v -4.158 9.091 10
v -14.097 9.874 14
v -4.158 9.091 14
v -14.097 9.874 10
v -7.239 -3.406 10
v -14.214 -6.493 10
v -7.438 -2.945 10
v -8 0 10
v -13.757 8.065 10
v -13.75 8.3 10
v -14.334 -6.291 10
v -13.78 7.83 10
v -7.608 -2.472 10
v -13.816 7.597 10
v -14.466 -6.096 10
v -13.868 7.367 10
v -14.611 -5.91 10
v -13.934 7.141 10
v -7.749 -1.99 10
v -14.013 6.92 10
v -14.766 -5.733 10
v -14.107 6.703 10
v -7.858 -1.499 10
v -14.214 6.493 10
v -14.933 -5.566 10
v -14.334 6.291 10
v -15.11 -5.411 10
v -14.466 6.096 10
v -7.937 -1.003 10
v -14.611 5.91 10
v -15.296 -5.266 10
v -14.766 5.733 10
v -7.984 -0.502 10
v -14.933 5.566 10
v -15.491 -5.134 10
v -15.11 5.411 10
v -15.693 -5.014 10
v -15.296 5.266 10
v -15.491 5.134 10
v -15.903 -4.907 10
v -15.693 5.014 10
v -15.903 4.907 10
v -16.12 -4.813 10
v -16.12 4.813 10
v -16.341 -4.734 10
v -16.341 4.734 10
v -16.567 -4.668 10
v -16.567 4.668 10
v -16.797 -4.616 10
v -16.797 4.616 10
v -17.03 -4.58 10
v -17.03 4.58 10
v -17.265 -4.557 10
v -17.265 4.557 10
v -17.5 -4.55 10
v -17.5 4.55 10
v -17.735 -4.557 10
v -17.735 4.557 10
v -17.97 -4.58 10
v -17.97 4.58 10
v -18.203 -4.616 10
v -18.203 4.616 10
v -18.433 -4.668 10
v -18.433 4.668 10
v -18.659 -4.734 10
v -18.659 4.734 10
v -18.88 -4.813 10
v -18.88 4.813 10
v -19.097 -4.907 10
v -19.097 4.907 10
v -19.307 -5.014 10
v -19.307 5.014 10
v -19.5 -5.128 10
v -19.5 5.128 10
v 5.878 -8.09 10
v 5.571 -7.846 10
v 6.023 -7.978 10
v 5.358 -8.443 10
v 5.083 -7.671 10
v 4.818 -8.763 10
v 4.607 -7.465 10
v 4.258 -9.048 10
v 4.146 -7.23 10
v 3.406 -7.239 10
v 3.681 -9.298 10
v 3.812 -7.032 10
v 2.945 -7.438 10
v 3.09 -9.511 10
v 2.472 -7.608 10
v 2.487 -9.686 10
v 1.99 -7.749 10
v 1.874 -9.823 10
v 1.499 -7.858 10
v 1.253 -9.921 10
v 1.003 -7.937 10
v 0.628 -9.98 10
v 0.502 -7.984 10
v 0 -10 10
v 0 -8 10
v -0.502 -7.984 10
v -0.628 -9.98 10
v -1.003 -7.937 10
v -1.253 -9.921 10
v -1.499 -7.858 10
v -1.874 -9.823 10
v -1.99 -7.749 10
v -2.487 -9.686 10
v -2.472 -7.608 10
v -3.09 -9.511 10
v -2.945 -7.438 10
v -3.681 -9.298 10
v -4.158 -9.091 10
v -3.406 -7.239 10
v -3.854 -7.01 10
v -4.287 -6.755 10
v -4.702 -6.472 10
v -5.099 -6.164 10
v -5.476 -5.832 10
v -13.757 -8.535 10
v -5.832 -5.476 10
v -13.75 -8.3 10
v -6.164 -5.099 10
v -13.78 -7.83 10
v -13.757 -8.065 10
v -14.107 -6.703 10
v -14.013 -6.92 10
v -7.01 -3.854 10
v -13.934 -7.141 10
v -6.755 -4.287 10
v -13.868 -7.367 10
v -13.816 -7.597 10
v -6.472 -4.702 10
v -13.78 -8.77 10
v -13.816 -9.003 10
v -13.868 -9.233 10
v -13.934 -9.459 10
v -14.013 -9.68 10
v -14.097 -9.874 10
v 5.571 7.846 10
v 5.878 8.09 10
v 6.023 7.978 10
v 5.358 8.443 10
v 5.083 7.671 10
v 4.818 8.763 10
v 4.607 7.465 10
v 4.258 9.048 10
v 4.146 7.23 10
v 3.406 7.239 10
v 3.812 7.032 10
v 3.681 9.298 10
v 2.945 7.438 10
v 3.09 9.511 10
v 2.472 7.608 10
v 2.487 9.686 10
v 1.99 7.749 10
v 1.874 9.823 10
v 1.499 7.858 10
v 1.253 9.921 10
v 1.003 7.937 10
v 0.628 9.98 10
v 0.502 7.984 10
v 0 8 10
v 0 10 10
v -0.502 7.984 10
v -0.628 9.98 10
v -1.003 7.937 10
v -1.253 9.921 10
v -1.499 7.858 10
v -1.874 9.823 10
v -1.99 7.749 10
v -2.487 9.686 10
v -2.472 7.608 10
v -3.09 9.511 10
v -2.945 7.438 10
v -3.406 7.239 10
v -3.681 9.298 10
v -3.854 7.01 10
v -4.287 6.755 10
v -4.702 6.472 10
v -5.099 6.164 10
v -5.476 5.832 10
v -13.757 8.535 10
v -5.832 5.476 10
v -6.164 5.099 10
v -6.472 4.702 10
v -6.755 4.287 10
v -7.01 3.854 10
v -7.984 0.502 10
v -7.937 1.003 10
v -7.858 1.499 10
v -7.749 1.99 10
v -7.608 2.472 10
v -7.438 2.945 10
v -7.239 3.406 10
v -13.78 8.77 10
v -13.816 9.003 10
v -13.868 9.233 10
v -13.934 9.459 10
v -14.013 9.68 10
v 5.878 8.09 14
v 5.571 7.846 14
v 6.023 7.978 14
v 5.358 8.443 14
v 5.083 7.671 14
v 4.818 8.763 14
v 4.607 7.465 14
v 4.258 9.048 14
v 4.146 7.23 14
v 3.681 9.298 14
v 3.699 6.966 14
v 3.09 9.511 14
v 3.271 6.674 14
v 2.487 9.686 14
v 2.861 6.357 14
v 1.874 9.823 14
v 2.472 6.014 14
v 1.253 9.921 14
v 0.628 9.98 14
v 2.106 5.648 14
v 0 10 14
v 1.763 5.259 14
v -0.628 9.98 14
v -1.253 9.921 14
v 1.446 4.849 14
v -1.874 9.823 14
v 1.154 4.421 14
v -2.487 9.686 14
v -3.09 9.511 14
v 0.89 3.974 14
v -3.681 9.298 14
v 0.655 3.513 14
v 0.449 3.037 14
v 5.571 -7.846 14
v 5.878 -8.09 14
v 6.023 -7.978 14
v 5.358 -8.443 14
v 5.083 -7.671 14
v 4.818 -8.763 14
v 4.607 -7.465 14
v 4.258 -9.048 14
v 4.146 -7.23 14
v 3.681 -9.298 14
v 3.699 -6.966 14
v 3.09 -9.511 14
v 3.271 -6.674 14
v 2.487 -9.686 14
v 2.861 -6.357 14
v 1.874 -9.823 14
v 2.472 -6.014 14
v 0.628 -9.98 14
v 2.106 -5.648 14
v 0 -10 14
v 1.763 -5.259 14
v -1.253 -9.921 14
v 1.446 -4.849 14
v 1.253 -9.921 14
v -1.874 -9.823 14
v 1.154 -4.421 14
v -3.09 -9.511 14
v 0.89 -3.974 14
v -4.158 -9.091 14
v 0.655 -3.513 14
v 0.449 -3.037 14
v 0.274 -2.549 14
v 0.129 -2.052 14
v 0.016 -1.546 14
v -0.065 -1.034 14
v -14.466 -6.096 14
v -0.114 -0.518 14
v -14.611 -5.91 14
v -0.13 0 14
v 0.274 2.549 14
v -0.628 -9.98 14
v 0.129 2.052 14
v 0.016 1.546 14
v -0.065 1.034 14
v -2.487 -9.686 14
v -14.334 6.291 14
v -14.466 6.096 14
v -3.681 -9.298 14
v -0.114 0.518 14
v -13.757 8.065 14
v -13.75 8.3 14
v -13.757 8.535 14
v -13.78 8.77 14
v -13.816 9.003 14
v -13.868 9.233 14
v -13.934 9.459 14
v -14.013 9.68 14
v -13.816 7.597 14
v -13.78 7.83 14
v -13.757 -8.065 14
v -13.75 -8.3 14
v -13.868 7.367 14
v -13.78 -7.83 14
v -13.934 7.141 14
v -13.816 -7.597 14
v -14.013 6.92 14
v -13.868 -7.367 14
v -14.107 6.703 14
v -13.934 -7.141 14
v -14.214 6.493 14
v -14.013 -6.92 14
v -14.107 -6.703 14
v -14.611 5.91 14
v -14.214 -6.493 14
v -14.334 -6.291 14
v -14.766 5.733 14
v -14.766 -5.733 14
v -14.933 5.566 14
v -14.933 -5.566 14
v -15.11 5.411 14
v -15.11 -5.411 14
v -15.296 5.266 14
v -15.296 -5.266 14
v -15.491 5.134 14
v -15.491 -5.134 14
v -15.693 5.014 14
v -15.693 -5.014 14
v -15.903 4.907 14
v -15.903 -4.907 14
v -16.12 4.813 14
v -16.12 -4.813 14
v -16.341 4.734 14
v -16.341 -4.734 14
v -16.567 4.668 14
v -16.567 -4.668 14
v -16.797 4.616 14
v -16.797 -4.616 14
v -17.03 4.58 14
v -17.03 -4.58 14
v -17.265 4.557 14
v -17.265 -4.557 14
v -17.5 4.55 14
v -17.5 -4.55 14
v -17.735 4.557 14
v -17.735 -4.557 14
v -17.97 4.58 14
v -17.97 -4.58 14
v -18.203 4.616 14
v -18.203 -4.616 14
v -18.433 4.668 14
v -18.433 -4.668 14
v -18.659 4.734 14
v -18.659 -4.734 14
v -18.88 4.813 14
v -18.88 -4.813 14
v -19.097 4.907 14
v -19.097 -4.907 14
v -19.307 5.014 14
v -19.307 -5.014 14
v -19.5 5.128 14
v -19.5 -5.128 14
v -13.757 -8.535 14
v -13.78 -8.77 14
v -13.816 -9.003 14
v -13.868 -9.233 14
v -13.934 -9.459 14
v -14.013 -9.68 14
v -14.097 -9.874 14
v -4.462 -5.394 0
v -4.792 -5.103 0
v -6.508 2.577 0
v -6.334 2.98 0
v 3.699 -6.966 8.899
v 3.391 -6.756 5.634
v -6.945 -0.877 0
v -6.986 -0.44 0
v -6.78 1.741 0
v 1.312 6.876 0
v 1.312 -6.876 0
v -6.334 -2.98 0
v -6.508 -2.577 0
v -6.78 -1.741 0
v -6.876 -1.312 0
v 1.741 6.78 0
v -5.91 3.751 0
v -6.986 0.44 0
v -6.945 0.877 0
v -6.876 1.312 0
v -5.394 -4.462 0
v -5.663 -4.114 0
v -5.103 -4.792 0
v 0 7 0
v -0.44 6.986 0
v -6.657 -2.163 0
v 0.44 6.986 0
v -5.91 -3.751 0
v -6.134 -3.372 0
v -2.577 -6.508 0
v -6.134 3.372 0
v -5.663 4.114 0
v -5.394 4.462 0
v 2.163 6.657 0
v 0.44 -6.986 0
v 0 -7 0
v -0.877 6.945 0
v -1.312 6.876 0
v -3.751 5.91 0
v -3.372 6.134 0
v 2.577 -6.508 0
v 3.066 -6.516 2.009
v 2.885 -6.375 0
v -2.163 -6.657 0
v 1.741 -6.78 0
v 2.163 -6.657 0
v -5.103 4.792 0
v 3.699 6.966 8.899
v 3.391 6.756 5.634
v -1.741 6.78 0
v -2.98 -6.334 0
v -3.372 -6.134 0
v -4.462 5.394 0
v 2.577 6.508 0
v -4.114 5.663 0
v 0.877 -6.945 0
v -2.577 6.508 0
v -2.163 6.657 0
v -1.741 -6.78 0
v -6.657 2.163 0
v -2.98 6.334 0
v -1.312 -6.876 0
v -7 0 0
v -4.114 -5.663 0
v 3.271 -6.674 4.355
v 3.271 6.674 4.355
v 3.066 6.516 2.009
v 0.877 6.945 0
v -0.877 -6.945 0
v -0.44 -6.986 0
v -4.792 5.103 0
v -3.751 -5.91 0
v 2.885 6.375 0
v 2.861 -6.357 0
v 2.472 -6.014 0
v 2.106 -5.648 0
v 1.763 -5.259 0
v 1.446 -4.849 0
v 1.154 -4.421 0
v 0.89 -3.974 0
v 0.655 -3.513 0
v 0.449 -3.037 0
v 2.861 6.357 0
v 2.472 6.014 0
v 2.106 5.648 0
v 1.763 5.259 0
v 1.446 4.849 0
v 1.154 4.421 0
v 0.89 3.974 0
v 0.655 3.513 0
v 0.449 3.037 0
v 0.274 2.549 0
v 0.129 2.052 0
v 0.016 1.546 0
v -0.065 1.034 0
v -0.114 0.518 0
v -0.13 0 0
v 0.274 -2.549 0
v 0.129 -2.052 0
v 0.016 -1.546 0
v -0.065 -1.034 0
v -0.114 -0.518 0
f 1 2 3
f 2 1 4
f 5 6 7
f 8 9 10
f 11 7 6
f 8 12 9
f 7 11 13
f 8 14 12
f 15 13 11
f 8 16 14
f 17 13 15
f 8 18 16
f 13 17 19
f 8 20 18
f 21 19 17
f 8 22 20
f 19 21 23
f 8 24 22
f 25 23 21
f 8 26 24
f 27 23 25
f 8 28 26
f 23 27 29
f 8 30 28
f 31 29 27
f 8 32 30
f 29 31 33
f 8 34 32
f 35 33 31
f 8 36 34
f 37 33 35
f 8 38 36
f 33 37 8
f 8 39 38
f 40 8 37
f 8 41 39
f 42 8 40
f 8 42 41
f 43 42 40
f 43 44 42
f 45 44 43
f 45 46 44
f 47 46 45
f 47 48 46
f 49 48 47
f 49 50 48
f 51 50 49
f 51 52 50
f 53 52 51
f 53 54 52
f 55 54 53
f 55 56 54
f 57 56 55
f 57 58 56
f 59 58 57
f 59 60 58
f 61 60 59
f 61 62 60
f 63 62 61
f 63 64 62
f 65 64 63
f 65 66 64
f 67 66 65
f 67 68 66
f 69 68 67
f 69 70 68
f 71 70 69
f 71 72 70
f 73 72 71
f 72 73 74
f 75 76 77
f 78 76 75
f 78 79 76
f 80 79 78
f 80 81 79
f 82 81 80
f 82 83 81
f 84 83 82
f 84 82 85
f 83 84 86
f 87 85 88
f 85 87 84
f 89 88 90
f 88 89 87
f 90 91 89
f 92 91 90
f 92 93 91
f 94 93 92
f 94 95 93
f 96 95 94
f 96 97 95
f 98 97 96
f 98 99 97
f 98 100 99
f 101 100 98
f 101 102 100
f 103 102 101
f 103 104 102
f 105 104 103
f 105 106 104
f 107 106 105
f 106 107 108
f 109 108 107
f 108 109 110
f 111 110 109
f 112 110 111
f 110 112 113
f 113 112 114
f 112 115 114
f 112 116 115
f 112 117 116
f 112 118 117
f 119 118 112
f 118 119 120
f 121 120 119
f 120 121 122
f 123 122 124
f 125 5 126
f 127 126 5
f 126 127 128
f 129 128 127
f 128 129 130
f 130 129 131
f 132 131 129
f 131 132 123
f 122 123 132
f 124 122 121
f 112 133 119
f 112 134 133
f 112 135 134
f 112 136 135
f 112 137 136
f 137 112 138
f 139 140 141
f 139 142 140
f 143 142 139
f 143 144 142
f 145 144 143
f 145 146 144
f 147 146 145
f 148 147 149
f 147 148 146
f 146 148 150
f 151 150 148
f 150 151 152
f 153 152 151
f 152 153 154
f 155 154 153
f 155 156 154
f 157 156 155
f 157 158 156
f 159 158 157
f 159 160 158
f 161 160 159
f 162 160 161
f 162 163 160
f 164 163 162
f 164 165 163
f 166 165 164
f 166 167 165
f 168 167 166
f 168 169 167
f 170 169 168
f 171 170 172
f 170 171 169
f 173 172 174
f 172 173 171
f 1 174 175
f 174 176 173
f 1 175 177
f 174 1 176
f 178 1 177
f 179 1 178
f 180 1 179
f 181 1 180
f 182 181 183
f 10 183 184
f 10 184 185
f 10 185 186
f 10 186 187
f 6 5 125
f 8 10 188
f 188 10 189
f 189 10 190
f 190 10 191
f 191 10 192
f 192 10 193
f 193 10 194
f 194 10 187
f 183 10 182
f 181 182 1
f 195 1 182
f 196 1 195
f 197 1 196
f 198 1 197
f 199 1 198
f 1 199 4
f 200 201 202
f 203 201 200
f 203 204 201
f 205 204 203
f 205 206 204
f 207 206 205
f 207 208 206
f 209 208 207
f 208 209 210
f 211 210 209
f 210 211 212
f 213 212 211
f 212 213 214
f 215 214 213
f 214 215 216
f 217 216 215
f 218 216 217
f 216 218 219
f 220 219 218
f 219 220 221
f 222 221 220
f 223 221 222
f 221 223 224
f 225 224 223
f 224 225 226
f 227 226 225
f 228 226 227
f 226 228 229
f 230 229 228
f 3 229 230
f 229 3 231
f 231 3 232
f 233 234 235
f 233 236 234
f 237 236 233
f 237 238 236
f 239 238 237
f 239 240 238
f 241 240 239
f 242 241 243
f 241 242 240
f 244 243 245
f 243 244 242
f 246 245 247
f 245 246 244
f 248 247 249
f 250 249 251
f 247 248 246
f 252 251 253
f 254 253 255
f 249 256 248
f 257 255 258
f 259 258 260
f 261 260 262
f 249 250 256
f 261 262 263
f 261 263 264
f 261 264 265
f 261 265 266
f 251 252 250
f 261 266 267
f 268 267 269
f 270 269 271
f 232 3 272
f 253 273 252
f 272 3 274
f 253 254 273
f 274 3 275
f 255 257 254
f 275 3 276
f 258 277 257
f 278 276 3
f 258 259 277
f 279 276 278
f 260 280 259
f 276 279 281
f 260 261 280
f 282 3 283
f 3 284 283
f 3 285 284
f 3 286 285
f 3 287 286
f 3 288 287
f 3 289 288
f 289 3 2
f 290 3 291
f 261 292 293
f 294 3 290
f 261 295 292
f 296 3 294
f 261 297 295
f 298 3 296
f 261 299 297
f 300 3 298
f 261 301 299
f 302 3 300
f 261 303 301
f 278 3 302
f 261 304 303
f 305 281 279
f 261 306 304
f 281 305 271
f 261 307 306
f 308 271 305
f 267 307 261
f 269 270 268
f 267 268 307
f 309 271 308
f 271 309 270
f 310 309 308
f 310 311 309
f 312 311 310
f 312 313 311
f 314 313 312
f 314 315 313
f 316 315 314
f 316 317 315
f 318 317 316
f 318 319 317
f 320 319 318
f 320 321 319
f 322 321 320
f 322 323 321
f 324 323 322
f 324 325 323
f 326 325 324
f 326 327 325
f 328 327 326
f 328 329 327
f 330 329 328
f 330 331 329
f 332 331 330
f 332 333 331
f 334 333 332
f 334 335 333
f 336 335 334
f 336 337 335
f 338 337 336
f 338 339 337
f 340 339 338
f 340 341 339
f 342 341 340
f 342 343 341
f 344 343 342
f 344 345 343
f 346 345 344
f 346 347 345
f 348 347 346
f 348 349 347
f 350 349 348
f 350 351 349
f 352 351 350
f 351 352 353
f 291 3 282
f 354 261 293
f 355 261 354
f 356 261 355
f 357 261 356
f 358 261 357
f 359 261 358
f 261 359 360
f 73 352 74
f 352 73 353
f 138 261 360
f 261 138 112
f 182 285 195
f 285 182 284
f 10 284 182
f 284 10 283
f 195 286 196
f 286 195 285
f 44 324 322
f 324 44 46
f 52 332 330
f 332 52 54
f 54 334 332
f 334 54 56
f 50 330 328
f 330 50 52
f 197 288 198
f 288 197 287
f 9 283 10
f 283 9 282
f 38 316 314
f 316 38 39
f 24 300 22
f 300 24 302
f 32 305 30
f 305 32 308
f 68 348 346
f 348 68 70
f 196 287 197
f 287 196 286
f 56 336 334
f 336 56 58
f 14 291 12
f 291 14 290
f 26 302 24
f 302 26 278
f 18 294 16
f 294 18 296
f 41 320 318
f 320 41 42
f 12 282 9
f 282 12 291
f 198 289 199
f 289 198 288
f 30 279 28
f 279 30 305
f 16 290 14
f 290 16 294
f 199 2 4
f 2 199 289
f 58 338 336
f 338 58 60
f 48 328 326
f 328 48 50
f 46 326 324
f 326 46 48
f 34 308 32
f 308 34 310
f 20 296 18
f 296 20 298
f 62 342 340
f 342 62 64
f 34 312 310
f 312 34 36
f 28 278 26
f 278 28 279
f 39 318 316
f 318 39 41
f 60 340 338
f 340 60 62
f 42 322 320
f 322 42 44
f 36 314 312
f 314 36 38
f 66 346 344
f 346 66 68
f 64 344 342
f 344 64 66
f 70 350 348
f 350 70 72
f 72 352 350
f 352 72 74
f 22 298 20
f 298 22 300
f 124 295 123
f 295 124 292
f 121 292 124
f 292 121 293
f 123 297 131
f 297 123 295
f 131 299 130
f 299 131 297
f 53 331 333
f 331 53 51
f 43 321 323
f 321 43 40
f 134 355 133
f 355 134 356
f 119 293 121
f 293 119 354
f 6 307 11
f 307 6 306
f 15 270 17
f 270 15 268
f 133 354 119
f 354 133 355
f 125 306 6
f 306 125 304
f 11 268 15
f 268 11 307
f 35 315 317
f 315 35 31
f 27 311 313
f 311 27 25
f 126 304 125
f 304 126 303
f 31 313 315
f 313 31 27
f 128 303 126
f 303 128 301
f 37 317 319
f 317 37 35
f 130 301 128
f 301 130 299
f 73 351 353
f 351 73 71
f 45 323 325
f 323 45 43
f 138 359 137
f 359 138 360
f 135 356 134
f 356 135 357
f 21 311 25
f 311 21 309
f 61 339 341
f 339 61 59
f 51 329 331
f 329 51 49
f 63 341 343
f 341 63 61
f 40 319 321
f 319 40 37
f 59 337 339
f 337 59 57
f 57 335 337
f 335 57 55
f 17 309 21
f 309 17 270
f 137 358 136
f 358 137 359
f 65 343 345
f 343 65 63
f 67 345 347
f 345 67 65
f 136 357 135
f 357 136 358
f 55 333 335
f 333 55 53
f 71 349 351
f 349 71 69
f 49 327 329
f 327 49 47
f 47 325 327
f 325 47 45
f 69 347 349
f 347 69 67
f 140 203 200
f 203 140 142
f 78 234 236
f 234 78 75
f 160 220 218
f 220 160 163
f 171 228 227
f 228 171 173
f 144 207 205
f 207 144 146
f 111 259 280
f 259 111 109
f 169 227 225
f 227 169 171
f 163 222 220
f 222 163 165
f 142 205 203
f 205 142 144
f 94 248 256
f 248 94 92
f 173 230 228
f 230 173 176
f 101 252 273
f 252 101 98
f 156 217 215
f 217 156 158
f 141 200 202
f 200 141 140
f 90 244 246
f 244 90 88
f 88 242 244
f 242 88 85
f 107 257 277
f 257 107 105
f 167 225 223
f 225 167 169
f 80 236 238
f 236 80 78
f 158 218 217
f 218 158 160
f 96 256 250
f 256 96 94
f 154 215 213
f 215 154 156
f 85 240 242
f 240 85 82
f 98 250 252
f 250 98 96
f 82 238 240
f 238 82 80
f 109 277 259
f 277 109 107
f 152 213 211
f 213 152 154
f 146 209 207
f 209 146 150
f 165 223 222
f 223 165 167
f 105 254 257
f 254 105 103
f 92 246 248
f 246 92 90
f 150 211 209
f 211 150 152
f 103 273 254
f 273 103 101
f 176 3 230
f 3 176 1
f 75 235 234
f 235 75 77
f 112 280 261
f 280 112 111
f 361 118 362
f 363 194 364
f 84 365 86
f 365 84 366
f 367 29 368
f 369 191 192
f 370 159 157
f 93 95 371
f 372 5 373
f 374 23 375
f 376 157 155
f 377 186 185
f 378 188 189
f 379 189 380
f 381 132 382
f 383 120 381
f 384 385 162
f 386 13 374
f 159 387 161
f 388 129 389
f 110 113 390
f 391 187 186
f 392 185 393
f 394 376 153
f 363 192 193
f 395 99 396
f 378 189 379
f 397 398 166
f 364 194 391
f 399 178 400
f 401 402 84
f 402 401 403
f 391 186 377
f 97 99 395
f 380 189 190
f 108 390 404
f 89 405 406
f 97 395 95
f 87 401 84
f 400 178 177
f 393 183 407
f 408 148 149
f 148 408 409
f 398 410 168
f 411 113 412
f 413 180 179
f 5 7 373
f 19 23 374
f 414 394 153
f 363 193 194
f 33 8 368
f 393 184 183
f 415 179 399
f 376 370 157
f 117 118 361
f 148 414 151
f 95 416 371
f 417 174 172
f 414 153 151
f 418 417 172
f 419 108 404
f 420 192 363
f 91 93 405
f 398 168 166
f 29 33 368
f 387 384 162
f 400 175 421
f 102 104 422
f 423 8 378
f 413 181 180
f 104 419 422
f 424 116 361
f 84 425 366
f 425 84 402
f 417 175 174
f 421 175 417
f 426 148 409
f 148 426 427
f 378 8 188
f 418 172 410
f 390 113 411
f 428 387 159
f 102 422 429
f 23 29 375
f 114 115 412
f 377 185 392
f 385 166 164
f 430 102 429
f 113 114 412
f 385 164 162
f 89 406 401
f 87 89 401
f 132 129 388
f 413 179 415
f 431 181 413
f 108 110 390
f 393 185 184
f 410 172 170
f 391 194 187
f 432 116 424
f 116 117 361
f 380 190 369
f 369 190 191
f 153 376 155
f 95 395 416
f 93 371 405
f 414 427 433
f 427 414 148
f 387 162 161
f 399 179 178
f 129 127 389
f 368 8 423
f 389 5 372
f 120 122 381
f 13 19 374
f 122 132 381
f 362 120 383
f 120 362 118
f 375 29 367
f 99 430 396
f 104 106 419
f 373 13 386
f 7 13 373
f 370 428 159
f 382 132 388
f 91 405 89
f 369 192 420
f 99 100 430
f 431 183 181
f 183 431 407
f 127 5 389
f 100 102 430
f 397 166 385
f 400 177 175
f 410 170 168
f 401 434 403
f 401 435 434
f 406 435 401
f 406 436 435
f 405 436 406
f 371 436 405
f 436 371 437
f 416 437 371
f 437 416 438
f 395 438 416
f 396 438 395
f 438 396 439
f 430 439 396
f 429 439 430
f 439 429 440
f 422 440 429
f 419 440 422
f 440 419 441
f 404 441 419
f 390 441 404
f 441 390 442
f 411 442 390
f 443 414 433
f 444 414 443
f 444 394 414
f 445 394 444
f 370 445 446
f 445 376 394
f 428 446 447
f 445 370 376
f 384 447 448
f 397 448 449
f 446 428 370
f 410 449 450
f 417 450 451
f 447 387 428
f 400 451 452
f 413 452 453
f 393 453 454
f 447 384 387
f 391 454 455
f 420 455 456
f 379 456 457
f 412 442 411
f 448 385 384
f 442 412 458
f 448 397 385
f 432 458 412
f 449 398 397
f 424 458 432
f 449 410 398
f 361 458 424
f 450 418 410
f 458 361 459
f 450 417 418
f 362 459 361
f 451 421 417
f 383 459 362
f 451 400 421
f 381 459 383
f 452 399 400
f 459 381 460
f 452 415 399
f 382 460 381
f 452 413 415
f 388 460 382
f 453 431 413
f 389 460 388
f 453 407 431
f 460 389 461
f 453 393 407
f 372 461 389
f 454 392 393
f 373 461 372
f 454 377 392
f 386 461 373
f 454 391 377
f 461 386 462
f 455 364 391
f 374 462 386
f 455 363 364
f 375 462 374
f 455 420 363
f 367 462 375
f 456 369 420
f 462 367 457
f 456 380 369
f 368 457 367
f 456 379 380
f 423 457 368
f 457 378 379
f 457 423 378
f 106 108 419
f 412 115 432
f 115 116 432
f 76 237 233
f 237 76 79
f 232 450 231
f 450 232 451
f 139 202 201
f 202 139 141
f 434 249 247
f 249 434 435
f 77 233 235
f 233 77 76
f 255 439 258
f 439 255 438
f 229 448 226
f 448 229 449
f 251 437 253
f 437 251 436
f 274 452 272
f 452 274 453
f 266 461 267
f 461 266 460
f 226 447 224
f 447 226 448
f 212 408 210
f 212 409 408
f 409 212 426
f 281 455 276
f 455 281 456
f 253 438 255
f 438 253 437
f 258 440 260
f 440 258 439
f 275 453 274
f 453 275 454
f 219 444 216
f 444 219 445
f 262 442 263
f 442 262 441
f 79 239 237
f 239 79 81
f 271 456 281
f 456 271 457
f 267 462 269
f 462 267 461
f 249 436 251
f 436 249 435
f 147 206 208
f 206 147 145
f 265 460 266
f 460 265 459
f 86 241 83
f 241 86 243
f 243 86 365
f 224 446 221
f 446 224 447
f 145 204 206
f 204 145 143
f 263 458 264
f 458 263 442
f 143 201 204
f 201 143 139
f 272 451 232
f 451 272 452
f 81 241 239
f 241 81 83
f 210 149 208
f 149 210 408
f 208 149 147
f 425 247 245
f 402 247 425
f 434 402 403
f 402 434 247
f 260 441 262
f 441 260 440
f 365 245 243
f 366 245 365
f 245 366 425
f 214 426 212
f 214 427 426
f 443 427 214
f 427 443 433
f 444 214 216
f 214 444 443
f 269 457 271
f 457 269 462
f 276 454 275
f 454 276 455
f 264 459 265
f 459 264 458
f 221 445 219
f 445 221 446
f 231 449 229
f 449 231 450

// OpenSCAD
//This piece is for the Deltaprintr; It should prevent the Hotend from moving out of the platform

/* [Parameters] */
//This is the Hotend upper diameter usually around 16mm. It'll add 0.5mm to that value to make assembly easier
Diameter_Hotend = 16;   
//Big upper ø should be around 20mm
Big_Diameter = 20;     
//Little Diameter
little_Diameter = 16;   
//the lower little ø is the upper little ø - cone
Cone = 1;               
//The Height of the upper ø
Upper_Height = 4;       
//The Height of the lower ø
Lower_Height = 10;      

/* [Hole for wires?] */
//With hole for wires?
hole = "off"; //[on:with Hole,off:without Hole]
//Holediameter
holedia = 10; //[1:1:10]    

/* [Traxxas] */

//Traxxas On-Off 
Tra = "on"; //[on:with Traxxas,off:without Traxxas]

//Distance between centre and traxas-joint outer
xdis=17.5;
ydis=8.3;

//Diameter of Traxxas-Joint-mount
traxdia=7.5;


///////////////
///Render//////
///////////////

//Renderquality
$fn= 100;       
difference(){
whole();
minus();
}

//Modules
/* [Hidden] */
d1= Diameter_Hotend+0.5;
h1= Lower_Height;
d2= little_Diameter;
d3 = Big_Diameter;
h2= Upper_Height;
cone = Cone;
module whole(){

    if (Tra == "on"){
    withtra();
    }else{
    withouttra();}
    
}

module top(){
translate([0,0,h1])
    cylinder(h2,d3/2,d3/2);
}

module shaft (){
    cylinder (h1,d2/2-cone,d2/2); 
} 

module minus(){
    translate ([8.12,0,-1]) 
        cylinder (h1+h2+2,d1/2,d1/2);
    if (hole == "on"){
    withhole();
    }else{
   }
}

module withhole(){
    translate ([0,0,-1]) 
    cylinder(h1+h2+2,holedia/2,holedia/2);
}

module traxas(){


difference(){
translate([0,0,h1])
linear_extrude(height =h2)
polygon(points=[[-3,d3/2-1],[-xdis-2,ydis+2],[-xdis-2,-ydis-2],[-3,-d3/2+1]]);

translate([-xdis,ydis,h1-1])
    cylinder(h2+2,traxdia/2,traxdia/2);
translate([-xdis,-ydis,h1-1])
    cylinder(h2+2,traxdia/2,traxdia/2);
}
}

module withtra(){
    
    union(){
    top();
    shaft();
    traxas();
}}

module withouttra(){
    union(){
    top();
    shaft();}}
